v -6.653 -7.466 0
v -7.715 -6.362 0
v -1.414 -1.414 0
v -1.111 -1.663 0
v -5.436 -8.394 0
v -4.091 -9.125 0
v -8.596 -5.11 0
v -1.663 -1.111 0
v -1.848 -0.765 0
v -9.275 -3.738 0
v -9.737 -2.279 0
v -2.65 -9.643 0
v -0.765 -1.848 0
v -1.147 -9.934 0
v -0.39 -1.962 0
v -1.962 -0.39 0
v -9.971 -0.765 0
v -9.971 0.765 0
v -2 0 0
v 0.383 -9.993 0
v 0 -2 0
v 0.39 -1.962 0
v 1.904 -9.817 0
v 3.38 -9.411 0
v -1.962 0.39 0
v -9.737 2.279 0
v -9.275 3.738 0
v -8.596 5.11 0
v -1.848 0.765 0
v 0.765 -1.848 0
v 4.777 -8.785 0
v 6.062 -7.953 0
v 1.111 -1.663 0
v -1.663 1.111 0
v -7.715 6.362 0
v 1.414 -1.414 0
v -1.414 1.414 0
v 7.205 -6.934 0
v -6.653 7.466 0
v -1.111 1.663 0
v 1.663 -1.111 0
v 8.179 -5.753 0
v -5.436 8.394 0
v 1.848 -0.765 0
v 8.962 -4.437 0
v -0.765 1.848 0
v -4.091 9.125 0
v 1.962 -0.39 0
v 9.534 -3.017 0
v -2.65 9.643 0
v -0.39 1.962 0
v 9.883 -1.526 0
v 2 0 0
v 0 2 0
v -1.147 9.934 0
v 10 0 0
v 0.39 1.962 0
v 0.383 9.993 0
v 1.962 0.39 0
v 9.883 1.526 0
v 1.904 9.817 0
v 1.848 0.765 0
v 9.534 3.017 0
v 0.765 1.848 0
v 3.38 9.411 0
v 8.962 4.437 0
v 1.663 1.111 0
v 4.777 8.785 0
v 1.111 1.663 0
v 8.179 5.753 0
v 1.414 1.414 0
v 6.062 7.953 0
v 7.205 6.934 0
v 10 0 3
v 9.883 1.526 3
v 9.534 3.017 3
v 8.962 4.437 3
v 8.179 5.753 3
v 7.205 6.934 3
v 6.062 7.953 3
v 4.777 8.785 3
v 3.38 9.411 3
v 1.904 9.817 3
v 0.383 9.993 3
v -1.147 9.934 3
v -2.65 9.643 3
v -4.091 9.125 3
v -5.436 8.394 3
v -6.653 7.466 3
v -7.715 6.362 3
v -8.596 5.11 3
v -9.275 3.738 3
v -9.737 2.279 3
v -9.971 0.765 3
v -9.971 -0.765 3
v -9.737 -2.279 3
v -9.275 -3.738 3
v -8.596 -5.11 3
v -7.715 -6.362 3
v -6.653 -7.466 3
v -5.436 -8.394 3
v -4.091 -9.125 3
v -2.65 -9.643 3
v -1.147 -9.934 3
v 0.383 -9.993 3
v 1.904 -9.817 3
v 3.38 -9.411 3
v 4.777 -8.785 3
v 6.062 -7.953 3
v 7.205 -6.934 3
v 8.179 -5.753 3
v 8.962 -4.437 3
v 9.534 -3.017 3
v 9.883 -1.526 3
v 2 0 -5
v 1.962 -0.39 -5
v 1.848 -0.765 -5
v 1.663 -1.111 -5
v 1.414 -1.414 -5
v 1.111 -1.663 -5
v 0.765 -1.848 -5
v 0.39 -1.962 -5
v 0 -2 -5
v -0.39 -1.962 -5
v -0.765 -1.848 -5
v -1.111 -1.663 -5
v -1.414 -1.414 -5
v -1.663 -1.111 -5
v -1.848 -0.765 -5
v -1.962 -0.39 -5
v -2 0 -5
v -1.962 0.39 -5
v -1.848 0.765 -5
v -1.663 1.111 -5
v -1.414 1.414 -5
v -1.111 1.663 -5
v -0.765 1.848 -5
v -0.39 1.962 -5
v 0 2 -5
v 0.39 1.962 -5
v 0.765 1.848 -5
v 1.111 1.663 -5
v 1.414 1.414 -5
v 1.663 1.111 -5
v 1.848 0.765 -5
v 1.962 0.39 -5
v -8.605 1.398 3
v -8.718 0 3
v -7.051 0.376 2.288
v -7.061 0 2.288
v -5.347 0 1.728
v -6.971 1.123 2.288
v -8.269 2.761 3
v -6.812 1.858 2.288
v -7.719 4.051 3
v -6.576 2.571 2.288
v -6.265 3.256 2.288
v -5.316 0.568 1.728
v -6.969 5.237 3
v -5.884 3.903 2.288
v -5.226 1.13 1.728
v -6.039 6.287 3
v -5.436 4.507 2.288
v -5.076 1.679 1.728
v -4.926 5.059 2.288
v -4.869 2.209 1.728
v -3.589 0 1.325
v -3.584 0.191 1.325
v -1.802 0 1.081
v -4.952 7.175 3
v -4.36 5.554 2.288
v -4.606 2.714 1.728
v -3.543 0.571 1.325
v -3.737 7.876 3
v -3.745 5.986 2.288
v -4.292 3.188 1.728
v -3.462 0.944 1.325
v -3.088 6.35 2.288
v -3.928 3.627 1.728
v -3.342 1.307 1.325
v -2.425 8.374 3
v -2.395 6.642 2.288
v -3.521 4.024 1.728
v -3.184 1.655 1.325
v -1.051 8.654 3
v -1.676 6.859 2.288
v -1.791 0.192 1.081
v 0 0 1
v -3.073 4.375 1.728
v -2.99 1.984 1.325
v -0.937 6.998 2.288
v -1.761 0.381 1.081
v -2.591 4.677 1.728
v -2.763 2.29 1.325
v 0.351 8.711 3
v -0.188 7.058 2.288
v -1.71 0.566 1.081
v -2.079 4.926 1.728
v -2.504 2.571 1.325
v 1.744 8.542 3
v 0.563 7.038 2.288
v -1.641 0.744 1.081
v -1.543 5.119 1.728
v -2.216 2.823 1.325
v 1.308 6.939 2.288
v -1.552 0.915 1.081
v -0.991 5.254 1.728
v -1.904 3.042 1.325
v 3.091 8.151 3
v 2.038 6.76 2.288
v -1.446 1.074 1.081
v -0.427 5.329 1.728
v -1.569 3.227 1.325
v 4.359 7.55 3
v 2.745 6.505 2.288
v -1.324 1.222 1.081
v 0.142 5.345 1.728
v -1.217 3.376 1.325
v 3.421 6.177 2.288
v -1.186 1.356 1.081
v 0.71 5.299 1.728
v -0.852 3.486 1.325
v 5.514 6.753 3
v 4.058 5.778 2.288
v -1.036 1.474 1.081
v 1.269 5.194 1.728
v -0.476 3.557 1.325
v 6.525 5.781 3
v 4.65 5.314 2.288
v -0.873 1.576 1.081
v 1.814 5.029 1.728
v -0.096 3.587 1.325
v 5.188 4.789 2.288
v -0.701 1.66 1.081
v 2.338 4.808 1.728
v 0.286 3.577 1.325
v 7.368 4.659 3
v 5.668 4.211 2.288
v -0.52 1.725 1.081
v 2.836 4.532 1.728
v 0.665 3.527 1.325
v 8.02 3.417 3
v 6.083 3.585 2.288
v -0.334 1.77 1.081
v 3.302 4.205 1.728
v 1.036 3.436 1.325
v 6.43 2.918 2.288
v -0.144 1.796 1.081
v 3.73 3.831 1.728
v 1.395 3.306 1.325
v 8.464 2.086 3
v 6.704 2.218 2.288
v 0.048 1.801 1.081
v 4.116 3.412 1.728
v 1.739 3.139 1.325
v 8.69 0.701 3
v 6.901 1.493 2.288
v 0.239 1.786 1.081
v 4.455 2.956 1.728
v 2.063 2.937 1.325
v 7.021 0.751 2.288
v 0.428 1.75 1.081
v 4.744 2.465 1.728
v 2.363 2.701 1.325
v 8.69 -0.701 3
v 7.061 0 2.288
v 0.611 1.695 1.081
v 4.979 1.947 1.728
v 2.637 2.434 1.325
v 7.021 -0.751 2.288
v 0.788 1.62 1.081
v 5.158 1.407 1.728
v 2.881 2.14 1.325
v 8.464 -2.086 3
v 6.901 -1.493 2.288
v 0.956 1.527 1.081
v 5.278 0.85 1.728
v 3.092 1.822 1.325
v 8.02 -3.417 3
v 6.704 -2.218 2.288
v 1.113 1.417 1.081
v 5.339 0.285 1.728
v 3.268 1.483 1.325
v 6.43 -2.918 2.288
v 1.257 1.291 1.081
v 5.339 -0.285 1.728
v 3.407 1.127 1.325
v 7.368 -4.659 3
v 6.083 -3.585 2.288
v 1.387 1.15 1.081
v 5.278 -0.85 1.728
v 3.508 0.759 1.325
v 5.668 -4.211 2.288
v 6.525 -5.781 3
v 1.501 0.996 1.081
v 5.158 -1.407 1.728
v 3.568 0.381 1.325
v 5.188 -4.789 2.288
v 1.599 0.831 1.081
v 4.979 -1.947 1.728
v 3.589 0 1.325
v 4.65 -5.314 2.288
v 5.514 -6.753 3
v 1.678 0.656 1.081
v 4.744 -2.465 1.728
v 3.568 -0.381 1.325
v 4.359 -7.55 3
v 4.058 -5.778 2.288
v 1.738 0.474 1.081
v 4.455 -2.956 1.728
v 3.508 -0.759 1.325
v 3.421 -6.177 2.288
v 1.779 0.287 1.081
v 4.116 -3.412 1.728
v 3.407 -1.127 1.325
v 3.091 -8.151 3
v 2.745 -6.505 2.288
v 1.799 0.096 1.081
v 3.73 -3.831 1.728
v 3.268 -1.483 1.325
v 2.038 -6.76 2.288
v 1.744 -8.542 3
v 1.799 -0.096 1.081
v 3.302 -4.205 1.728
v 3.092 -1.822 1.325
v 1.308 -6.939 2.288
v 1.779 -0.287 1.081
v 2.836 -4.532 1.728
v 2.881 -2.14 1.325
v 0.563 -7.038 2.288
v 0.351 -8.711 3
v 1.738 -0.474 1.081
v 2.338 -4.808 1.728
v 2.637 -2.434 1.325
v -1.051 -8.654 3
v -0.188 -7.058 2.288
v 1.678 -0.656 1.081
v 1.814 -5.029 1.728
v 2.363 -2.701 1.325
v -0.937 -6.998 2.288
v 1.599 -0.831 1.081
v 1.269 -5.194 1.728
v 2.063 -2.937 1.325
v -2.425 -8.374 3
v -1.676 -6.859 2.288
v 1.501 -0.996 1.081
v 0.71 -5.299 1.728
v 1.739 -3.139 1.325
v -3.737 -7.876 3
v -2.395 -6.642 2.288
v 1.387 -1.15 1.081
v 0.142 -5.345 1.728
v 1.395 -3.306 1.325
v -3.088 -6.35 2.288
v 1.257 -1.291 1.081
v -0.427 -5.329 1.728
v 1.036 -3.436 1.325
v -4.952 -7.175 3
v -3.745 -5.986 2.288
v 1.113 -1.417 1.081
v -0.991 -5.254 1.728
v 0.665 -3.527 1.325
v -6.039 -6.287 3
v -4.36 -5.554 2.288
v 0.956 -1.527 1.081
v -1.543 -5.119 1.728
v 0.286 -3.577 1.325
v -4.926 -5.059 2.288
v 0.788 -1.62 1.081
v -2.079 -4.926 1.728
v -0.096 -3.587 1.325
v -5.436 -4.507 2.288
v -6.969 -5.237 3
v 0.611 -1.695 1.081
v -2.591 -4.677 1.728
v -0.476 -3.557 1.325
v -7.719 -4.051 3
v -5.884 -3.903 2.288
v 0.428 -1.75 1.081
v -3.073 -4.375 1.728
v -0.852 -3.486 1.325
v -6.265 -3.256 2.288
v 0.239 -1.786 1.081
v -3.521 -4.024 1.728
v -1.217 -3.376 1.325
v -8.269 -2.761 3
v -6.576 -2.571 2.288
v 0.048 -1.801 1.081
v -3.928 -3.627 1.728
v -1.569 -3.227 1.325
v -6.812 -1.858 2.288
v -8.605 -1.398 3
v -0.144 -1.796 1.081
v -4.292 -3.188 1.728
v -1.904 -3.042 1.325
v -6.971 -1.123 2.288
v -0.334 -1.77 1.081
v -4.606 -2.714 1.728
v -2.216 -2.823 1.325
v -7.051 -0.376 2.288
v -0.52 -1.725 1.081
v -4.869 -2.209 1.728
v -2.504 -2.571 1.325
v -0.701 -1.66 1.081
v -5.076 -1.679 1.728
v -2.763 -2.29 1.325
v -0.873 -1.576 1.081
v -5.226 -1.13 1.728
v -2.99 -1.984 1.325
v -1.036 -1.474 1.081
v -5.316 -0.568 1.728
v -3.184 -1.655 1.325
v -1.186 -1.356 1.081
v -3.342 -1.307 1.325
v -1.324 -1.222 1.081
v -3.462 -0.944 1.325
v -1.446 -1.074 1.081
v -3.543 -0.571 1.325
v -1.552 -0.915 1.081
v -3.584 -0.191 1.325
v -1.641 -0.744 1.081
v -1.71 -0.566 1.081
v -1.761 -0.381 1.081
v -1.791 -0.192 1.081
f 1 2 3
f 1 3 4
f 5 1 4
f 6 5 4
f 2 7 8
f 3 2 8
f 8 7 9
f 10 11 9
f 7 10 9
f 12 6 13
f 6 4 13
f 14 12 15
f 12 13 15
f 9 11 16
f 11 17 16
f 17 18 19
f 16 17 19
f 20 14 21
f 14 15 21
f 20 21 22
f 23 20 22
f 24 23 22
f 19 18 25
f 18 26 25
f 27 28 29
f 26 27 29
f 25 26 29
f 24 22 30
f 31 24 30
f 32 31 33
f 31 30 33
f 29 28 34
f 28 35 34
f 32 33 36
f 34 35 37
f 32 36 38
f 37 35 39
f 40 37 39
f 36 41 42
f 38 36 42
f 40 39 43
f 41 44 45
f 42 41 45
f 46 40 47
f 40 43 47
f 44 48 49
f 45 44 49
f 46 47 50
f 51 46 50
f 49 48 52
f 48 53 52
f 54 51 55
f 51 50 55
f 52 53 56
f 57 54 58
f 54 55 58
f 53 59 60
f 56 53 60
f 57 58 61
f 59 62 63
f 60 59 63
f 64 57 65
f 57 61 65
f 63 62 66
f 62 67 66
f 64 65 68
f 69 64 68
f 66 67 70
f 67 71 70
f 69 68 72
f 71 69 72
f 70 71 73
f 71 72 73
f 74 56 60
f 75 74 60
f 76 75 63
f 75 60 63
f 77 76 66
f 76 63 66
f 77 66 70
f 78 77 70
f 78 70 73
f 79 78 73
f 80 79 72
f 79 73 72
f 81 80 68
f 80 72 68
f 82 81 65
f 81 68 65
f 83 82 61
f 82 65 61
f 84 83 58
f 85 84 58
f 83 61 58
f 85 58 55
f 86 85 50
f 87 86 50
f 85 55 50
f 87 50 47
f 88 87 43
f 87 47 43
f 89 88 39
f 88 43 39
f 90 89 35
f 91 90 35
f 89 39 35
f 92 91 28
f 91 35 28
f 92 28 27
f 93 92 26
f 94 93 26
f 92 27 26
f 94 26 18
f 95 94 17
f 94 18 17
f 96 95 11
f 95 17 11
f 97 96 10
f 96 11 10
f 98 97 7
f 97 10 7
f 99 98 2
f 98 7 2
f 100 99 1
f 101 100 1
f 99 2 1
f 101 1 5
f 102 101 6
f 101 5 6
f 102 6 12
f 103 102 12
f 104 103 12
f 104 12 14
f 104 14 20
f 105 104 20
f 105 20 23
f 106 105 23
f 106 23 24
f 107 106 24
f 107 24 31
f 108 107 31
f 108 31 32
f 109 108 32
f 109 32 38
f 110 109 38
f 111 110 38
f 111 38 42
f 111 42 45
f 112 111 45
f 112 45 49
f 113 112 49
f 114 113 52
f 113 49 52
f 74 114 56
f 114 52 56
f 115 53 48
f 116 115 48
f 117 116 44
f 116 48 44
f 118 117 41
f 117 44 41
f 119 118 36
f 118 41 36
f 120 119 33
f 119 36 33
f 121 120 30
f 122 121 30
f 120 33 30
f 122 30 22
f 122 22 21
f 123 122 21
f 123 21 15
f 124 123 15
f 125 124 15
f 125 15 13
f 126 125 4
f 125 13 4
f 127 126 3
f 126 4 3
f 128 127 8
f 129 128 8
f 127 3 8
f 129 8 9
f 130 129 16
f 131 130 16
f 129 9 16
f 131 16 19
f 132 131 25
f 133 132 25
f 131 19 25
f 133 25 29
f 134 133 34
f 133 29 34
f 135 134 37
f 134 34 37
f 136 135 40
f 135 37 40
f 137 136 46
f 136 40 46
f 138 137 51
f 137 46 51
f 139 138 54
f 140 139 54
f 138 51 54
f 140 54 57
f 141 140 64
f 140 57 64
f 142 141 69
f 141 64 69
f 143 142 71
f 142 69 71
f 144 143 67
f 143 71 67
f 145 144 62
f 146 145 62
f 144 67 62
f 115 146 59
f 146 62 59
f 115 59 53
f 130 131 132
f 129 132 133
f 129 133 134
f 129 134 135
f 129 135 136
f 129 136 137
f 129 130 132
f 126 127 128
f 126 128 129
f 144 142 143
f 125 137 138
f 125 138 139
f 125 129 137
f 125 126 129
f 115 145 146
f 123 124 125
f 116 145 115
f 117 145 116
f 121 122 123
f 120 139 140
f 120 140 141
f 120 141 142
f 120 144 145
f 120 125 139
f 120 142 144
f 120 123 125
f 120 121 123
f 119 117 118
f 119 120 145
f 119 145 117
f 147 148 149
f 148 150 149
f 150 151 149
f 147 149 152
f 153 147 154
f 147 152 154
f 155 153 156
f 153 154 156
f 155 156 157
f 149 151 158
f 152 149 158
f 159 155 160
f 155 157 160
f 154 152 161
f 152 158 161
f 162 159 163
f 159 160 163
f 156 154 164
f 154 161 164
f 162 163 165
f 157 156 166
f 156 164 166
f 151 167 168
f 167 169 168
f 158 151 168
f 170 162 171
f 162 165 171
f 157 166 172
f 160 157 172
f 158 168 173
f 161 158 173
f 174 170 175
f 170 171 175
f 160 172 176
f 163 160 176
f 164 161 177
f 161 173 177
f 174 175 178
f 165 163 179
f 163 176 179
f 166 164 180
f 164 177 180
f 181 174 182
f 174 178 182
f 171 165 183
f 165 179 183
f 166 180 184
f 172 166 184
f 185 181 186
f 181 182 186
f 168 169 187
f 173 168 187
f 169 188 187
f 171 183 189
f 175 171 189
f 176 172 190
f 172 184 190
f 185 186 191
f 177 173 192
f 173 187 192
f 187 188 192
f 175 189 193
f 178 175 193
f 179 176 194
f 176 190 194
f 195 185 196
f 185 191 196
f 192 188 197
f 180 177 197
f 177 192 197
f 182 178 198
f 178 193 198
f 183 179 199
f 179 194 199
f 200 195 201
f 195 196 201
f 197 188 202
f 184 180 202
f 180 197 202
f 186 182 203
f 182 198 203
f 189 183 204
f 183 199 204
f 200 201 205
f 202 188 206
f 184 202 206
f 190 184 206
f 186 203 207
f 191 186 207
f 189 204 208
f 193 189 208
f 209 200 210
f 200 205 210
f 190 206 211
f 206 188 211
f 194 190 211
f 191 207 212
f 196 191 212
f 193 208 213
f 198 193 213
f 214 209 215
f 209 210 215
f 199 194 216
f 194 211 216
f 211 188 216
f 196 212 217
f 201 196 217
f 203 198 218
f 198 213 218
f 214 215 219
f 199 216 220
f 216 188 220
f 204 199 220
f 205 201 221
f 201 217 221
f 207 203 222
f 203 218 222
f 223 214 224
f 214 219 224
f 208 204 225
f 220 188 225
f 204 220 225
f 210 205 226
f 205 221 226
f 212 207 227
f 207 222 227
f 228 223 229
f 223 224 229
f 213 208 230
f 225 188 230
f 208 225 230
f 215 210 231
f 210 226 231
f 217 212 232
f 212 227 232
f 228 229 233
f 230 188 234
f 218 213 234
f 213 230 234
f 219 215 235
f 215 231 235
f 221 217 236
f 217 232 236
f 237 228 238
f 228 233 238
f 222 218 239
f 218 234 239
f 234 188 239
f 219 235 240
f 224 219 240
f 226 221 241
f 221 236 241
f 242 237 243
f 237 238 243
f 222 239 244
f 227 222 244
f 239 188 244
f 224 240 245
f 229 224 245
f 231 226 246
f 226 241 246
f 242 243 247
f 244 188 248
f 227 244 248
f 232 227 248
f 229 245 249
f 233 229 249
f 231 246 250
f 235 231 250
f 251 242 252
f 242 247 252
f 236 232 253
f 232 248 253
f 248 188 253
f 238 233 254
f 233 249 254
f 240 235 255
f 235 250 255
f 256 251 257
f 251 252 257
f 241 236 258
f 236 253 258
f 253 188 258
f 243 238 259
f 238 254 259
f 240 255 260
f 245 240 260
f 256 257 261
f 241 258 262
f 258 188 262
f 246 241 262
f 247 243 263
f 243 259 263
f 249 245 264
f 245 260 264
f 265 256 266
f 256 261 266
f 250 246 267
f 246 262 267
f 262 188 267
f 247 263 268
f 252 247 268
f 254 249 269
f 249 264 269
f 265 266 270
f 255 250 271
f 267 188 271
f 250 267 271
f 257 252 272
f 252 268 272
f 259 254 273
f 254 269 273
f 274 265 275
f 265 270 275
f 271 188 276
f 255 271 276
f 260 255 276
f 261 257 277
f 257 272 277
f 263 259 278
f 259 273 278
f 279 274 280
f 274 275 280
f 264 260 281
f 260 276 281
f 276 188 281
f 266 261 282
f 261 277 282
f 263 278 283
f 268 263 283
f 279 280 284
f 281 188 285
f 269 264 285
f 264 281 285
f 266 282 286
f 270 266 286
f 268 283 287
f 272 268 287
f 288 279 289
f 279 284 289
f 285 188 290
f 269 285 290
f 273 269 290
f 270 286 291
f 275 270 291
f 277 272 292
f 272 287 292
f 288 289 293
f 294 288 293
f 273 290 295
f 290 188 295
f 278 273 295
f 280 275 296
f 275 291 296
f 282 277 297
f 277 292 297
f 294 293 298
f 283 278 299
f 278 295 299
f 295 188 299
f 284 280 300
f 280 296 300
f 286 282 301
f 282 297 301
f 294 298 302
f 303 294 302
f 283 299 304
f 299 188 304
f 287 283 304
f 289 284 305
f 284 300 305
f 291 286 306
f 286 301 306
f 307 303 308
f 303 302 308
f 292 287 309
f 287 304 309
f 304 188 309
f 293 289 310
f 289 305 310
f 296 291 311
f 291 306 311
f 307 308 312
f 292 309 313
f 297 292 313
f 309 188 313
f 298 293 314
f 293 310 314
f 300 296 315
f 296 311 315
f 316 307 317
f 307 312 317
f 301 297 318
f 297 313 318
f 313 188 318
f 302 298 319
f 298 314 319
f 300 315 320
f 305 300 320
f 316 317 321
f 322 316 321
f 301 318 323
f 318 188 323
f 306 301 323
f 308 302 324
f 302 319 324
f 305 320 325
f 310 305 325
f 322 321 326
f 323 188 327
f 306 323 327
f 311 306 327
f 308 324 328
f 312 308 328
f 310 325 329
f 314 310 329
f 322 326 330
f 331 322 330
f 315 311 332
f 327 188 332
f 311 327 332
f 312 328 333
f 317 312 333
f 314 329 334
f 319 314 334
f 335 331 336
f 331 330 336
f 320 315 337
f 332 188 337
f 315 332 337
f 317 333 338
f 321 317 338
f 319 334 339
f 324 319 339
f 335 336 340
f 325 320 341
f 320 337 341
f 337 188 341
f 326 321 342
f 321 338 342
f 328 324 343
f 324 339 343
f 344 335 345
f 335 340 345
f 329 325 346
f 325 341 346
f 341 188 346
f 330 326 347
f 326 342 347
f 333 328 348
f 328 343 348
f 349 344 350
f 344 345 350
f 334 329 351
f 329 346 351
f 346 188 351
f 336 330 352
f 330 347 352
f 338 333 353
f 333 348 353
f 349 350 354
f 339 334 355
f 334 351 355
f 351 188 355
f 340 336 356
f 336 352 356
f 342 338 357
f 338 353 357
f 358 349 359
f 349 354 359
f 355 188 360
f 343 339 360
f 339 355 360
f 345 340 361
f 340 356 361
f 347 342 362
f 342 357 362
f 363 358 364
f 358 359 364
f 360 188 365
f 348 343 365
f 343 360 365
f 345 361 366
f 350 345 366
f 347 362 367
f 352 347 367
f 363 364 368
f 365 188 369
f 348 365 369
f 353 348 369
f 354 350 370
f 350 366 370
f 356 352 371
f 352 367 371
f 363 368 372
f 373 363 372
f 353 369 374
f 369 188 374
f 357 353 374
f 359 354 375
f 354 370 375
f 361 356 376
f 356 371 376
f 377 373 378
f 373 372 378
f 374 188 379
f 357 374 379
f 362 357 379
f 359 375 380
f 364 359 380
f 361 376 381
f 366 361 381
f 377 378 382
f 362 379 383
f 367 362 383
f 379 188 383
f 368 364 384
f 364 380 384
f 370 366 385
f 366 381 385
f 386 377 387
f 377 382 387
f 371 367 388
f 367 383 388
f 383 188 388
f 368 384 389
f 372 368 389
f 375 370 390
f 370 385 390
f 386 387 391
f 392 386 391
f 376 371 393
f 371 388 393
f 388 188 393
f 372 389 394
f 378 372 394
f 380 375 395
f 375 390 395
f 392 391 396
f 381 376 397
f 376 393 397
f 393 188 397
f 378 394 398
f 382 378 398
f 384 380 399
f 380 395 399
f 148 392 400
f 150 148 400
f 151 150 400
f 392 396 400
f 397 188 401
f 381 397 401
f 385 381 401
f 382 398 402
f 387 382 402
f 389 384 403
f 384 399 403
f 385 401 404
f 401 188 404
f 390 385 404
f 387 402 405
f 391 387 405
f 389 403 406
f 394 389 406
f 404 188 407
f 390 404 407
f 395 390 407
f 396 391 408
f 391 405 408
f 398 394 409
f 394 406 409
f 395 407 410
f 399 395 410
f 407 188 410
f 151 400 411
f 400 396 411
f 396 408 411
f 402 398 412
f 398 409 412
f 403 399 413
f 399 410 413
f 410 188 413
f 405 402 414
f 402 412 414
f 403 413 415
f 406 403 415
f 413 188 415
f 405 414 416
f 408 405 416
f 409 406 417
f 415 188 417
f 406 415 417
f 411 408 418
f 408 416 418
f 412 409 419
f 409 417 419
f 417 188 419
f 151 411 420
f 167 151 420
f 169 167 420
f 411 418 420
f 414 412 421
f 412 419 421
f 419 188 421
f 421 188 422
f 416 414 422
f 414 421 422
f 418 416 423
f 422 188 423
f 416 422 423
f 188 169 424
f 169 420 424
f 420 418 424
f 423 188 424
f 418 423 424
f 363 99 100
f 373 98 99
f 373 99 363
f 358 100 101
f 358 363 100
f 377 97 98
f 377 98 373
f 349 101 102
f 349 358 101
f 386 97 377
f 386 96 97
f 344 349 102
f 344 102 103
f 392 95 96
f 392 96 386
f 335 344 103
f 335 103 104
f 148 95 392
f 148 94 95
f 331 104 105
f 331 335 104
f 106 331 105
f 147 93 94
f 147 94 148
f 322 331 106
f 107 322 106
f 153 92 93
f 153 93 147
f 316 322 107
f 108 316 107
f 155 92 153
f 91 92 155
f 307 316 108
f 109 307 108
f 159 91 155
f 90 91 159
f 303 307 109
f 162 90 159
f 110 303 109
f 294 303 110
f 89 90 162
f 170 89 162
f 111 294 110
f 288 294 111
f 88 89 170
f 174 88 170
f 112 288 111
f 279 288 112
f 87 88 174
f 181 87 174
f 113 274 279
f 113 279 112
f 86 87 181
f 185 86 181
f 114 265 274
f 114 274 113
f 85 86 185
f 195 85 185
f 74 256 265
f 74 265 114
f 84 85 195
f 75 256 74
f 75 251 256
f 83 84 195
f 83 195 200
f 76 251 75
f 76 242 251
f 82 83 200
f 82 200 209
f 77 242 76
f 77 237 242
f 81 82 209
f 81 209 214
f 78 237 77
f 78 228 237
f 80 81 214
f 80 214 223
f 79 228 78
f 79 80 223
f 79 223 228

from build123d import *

# Parameters (mm, degrees)
F0_R     = 10
F1_DEPTH = 3
F4_R     = 2
F5_DEPTH = 5


with BuildPart() as f1:
    # F0 (on Top) → F1 (new body)
    with BuildSketch(Plane.XY):
        Circle(F0_R)
    extrude(amount=F1_DEPTH)

    # F2 (on Front) → F3 (revolve, cut)
    with BuildSketch(Plane.XZ):
        with BuildLine():
            Line((0, 1), (0, 41))
            ThreePointArc((0, 41), (-20, 21), (0, 1))
        make_face()
    revolve(axis=Axis((0, 0, 27.434054), (0, 0, -1)), mode=Mode.SUBTRACT)

    # F4 (on face) → F5 (join)
    with BuildSketch(Plane(origin=(0, 0, 0), x_dir=(1, 0, 0), z_dir=(0, 0, -1))):
        Circle(F4_R)
    extrude(amount=F5_DEPTH)


solid = f1.part
